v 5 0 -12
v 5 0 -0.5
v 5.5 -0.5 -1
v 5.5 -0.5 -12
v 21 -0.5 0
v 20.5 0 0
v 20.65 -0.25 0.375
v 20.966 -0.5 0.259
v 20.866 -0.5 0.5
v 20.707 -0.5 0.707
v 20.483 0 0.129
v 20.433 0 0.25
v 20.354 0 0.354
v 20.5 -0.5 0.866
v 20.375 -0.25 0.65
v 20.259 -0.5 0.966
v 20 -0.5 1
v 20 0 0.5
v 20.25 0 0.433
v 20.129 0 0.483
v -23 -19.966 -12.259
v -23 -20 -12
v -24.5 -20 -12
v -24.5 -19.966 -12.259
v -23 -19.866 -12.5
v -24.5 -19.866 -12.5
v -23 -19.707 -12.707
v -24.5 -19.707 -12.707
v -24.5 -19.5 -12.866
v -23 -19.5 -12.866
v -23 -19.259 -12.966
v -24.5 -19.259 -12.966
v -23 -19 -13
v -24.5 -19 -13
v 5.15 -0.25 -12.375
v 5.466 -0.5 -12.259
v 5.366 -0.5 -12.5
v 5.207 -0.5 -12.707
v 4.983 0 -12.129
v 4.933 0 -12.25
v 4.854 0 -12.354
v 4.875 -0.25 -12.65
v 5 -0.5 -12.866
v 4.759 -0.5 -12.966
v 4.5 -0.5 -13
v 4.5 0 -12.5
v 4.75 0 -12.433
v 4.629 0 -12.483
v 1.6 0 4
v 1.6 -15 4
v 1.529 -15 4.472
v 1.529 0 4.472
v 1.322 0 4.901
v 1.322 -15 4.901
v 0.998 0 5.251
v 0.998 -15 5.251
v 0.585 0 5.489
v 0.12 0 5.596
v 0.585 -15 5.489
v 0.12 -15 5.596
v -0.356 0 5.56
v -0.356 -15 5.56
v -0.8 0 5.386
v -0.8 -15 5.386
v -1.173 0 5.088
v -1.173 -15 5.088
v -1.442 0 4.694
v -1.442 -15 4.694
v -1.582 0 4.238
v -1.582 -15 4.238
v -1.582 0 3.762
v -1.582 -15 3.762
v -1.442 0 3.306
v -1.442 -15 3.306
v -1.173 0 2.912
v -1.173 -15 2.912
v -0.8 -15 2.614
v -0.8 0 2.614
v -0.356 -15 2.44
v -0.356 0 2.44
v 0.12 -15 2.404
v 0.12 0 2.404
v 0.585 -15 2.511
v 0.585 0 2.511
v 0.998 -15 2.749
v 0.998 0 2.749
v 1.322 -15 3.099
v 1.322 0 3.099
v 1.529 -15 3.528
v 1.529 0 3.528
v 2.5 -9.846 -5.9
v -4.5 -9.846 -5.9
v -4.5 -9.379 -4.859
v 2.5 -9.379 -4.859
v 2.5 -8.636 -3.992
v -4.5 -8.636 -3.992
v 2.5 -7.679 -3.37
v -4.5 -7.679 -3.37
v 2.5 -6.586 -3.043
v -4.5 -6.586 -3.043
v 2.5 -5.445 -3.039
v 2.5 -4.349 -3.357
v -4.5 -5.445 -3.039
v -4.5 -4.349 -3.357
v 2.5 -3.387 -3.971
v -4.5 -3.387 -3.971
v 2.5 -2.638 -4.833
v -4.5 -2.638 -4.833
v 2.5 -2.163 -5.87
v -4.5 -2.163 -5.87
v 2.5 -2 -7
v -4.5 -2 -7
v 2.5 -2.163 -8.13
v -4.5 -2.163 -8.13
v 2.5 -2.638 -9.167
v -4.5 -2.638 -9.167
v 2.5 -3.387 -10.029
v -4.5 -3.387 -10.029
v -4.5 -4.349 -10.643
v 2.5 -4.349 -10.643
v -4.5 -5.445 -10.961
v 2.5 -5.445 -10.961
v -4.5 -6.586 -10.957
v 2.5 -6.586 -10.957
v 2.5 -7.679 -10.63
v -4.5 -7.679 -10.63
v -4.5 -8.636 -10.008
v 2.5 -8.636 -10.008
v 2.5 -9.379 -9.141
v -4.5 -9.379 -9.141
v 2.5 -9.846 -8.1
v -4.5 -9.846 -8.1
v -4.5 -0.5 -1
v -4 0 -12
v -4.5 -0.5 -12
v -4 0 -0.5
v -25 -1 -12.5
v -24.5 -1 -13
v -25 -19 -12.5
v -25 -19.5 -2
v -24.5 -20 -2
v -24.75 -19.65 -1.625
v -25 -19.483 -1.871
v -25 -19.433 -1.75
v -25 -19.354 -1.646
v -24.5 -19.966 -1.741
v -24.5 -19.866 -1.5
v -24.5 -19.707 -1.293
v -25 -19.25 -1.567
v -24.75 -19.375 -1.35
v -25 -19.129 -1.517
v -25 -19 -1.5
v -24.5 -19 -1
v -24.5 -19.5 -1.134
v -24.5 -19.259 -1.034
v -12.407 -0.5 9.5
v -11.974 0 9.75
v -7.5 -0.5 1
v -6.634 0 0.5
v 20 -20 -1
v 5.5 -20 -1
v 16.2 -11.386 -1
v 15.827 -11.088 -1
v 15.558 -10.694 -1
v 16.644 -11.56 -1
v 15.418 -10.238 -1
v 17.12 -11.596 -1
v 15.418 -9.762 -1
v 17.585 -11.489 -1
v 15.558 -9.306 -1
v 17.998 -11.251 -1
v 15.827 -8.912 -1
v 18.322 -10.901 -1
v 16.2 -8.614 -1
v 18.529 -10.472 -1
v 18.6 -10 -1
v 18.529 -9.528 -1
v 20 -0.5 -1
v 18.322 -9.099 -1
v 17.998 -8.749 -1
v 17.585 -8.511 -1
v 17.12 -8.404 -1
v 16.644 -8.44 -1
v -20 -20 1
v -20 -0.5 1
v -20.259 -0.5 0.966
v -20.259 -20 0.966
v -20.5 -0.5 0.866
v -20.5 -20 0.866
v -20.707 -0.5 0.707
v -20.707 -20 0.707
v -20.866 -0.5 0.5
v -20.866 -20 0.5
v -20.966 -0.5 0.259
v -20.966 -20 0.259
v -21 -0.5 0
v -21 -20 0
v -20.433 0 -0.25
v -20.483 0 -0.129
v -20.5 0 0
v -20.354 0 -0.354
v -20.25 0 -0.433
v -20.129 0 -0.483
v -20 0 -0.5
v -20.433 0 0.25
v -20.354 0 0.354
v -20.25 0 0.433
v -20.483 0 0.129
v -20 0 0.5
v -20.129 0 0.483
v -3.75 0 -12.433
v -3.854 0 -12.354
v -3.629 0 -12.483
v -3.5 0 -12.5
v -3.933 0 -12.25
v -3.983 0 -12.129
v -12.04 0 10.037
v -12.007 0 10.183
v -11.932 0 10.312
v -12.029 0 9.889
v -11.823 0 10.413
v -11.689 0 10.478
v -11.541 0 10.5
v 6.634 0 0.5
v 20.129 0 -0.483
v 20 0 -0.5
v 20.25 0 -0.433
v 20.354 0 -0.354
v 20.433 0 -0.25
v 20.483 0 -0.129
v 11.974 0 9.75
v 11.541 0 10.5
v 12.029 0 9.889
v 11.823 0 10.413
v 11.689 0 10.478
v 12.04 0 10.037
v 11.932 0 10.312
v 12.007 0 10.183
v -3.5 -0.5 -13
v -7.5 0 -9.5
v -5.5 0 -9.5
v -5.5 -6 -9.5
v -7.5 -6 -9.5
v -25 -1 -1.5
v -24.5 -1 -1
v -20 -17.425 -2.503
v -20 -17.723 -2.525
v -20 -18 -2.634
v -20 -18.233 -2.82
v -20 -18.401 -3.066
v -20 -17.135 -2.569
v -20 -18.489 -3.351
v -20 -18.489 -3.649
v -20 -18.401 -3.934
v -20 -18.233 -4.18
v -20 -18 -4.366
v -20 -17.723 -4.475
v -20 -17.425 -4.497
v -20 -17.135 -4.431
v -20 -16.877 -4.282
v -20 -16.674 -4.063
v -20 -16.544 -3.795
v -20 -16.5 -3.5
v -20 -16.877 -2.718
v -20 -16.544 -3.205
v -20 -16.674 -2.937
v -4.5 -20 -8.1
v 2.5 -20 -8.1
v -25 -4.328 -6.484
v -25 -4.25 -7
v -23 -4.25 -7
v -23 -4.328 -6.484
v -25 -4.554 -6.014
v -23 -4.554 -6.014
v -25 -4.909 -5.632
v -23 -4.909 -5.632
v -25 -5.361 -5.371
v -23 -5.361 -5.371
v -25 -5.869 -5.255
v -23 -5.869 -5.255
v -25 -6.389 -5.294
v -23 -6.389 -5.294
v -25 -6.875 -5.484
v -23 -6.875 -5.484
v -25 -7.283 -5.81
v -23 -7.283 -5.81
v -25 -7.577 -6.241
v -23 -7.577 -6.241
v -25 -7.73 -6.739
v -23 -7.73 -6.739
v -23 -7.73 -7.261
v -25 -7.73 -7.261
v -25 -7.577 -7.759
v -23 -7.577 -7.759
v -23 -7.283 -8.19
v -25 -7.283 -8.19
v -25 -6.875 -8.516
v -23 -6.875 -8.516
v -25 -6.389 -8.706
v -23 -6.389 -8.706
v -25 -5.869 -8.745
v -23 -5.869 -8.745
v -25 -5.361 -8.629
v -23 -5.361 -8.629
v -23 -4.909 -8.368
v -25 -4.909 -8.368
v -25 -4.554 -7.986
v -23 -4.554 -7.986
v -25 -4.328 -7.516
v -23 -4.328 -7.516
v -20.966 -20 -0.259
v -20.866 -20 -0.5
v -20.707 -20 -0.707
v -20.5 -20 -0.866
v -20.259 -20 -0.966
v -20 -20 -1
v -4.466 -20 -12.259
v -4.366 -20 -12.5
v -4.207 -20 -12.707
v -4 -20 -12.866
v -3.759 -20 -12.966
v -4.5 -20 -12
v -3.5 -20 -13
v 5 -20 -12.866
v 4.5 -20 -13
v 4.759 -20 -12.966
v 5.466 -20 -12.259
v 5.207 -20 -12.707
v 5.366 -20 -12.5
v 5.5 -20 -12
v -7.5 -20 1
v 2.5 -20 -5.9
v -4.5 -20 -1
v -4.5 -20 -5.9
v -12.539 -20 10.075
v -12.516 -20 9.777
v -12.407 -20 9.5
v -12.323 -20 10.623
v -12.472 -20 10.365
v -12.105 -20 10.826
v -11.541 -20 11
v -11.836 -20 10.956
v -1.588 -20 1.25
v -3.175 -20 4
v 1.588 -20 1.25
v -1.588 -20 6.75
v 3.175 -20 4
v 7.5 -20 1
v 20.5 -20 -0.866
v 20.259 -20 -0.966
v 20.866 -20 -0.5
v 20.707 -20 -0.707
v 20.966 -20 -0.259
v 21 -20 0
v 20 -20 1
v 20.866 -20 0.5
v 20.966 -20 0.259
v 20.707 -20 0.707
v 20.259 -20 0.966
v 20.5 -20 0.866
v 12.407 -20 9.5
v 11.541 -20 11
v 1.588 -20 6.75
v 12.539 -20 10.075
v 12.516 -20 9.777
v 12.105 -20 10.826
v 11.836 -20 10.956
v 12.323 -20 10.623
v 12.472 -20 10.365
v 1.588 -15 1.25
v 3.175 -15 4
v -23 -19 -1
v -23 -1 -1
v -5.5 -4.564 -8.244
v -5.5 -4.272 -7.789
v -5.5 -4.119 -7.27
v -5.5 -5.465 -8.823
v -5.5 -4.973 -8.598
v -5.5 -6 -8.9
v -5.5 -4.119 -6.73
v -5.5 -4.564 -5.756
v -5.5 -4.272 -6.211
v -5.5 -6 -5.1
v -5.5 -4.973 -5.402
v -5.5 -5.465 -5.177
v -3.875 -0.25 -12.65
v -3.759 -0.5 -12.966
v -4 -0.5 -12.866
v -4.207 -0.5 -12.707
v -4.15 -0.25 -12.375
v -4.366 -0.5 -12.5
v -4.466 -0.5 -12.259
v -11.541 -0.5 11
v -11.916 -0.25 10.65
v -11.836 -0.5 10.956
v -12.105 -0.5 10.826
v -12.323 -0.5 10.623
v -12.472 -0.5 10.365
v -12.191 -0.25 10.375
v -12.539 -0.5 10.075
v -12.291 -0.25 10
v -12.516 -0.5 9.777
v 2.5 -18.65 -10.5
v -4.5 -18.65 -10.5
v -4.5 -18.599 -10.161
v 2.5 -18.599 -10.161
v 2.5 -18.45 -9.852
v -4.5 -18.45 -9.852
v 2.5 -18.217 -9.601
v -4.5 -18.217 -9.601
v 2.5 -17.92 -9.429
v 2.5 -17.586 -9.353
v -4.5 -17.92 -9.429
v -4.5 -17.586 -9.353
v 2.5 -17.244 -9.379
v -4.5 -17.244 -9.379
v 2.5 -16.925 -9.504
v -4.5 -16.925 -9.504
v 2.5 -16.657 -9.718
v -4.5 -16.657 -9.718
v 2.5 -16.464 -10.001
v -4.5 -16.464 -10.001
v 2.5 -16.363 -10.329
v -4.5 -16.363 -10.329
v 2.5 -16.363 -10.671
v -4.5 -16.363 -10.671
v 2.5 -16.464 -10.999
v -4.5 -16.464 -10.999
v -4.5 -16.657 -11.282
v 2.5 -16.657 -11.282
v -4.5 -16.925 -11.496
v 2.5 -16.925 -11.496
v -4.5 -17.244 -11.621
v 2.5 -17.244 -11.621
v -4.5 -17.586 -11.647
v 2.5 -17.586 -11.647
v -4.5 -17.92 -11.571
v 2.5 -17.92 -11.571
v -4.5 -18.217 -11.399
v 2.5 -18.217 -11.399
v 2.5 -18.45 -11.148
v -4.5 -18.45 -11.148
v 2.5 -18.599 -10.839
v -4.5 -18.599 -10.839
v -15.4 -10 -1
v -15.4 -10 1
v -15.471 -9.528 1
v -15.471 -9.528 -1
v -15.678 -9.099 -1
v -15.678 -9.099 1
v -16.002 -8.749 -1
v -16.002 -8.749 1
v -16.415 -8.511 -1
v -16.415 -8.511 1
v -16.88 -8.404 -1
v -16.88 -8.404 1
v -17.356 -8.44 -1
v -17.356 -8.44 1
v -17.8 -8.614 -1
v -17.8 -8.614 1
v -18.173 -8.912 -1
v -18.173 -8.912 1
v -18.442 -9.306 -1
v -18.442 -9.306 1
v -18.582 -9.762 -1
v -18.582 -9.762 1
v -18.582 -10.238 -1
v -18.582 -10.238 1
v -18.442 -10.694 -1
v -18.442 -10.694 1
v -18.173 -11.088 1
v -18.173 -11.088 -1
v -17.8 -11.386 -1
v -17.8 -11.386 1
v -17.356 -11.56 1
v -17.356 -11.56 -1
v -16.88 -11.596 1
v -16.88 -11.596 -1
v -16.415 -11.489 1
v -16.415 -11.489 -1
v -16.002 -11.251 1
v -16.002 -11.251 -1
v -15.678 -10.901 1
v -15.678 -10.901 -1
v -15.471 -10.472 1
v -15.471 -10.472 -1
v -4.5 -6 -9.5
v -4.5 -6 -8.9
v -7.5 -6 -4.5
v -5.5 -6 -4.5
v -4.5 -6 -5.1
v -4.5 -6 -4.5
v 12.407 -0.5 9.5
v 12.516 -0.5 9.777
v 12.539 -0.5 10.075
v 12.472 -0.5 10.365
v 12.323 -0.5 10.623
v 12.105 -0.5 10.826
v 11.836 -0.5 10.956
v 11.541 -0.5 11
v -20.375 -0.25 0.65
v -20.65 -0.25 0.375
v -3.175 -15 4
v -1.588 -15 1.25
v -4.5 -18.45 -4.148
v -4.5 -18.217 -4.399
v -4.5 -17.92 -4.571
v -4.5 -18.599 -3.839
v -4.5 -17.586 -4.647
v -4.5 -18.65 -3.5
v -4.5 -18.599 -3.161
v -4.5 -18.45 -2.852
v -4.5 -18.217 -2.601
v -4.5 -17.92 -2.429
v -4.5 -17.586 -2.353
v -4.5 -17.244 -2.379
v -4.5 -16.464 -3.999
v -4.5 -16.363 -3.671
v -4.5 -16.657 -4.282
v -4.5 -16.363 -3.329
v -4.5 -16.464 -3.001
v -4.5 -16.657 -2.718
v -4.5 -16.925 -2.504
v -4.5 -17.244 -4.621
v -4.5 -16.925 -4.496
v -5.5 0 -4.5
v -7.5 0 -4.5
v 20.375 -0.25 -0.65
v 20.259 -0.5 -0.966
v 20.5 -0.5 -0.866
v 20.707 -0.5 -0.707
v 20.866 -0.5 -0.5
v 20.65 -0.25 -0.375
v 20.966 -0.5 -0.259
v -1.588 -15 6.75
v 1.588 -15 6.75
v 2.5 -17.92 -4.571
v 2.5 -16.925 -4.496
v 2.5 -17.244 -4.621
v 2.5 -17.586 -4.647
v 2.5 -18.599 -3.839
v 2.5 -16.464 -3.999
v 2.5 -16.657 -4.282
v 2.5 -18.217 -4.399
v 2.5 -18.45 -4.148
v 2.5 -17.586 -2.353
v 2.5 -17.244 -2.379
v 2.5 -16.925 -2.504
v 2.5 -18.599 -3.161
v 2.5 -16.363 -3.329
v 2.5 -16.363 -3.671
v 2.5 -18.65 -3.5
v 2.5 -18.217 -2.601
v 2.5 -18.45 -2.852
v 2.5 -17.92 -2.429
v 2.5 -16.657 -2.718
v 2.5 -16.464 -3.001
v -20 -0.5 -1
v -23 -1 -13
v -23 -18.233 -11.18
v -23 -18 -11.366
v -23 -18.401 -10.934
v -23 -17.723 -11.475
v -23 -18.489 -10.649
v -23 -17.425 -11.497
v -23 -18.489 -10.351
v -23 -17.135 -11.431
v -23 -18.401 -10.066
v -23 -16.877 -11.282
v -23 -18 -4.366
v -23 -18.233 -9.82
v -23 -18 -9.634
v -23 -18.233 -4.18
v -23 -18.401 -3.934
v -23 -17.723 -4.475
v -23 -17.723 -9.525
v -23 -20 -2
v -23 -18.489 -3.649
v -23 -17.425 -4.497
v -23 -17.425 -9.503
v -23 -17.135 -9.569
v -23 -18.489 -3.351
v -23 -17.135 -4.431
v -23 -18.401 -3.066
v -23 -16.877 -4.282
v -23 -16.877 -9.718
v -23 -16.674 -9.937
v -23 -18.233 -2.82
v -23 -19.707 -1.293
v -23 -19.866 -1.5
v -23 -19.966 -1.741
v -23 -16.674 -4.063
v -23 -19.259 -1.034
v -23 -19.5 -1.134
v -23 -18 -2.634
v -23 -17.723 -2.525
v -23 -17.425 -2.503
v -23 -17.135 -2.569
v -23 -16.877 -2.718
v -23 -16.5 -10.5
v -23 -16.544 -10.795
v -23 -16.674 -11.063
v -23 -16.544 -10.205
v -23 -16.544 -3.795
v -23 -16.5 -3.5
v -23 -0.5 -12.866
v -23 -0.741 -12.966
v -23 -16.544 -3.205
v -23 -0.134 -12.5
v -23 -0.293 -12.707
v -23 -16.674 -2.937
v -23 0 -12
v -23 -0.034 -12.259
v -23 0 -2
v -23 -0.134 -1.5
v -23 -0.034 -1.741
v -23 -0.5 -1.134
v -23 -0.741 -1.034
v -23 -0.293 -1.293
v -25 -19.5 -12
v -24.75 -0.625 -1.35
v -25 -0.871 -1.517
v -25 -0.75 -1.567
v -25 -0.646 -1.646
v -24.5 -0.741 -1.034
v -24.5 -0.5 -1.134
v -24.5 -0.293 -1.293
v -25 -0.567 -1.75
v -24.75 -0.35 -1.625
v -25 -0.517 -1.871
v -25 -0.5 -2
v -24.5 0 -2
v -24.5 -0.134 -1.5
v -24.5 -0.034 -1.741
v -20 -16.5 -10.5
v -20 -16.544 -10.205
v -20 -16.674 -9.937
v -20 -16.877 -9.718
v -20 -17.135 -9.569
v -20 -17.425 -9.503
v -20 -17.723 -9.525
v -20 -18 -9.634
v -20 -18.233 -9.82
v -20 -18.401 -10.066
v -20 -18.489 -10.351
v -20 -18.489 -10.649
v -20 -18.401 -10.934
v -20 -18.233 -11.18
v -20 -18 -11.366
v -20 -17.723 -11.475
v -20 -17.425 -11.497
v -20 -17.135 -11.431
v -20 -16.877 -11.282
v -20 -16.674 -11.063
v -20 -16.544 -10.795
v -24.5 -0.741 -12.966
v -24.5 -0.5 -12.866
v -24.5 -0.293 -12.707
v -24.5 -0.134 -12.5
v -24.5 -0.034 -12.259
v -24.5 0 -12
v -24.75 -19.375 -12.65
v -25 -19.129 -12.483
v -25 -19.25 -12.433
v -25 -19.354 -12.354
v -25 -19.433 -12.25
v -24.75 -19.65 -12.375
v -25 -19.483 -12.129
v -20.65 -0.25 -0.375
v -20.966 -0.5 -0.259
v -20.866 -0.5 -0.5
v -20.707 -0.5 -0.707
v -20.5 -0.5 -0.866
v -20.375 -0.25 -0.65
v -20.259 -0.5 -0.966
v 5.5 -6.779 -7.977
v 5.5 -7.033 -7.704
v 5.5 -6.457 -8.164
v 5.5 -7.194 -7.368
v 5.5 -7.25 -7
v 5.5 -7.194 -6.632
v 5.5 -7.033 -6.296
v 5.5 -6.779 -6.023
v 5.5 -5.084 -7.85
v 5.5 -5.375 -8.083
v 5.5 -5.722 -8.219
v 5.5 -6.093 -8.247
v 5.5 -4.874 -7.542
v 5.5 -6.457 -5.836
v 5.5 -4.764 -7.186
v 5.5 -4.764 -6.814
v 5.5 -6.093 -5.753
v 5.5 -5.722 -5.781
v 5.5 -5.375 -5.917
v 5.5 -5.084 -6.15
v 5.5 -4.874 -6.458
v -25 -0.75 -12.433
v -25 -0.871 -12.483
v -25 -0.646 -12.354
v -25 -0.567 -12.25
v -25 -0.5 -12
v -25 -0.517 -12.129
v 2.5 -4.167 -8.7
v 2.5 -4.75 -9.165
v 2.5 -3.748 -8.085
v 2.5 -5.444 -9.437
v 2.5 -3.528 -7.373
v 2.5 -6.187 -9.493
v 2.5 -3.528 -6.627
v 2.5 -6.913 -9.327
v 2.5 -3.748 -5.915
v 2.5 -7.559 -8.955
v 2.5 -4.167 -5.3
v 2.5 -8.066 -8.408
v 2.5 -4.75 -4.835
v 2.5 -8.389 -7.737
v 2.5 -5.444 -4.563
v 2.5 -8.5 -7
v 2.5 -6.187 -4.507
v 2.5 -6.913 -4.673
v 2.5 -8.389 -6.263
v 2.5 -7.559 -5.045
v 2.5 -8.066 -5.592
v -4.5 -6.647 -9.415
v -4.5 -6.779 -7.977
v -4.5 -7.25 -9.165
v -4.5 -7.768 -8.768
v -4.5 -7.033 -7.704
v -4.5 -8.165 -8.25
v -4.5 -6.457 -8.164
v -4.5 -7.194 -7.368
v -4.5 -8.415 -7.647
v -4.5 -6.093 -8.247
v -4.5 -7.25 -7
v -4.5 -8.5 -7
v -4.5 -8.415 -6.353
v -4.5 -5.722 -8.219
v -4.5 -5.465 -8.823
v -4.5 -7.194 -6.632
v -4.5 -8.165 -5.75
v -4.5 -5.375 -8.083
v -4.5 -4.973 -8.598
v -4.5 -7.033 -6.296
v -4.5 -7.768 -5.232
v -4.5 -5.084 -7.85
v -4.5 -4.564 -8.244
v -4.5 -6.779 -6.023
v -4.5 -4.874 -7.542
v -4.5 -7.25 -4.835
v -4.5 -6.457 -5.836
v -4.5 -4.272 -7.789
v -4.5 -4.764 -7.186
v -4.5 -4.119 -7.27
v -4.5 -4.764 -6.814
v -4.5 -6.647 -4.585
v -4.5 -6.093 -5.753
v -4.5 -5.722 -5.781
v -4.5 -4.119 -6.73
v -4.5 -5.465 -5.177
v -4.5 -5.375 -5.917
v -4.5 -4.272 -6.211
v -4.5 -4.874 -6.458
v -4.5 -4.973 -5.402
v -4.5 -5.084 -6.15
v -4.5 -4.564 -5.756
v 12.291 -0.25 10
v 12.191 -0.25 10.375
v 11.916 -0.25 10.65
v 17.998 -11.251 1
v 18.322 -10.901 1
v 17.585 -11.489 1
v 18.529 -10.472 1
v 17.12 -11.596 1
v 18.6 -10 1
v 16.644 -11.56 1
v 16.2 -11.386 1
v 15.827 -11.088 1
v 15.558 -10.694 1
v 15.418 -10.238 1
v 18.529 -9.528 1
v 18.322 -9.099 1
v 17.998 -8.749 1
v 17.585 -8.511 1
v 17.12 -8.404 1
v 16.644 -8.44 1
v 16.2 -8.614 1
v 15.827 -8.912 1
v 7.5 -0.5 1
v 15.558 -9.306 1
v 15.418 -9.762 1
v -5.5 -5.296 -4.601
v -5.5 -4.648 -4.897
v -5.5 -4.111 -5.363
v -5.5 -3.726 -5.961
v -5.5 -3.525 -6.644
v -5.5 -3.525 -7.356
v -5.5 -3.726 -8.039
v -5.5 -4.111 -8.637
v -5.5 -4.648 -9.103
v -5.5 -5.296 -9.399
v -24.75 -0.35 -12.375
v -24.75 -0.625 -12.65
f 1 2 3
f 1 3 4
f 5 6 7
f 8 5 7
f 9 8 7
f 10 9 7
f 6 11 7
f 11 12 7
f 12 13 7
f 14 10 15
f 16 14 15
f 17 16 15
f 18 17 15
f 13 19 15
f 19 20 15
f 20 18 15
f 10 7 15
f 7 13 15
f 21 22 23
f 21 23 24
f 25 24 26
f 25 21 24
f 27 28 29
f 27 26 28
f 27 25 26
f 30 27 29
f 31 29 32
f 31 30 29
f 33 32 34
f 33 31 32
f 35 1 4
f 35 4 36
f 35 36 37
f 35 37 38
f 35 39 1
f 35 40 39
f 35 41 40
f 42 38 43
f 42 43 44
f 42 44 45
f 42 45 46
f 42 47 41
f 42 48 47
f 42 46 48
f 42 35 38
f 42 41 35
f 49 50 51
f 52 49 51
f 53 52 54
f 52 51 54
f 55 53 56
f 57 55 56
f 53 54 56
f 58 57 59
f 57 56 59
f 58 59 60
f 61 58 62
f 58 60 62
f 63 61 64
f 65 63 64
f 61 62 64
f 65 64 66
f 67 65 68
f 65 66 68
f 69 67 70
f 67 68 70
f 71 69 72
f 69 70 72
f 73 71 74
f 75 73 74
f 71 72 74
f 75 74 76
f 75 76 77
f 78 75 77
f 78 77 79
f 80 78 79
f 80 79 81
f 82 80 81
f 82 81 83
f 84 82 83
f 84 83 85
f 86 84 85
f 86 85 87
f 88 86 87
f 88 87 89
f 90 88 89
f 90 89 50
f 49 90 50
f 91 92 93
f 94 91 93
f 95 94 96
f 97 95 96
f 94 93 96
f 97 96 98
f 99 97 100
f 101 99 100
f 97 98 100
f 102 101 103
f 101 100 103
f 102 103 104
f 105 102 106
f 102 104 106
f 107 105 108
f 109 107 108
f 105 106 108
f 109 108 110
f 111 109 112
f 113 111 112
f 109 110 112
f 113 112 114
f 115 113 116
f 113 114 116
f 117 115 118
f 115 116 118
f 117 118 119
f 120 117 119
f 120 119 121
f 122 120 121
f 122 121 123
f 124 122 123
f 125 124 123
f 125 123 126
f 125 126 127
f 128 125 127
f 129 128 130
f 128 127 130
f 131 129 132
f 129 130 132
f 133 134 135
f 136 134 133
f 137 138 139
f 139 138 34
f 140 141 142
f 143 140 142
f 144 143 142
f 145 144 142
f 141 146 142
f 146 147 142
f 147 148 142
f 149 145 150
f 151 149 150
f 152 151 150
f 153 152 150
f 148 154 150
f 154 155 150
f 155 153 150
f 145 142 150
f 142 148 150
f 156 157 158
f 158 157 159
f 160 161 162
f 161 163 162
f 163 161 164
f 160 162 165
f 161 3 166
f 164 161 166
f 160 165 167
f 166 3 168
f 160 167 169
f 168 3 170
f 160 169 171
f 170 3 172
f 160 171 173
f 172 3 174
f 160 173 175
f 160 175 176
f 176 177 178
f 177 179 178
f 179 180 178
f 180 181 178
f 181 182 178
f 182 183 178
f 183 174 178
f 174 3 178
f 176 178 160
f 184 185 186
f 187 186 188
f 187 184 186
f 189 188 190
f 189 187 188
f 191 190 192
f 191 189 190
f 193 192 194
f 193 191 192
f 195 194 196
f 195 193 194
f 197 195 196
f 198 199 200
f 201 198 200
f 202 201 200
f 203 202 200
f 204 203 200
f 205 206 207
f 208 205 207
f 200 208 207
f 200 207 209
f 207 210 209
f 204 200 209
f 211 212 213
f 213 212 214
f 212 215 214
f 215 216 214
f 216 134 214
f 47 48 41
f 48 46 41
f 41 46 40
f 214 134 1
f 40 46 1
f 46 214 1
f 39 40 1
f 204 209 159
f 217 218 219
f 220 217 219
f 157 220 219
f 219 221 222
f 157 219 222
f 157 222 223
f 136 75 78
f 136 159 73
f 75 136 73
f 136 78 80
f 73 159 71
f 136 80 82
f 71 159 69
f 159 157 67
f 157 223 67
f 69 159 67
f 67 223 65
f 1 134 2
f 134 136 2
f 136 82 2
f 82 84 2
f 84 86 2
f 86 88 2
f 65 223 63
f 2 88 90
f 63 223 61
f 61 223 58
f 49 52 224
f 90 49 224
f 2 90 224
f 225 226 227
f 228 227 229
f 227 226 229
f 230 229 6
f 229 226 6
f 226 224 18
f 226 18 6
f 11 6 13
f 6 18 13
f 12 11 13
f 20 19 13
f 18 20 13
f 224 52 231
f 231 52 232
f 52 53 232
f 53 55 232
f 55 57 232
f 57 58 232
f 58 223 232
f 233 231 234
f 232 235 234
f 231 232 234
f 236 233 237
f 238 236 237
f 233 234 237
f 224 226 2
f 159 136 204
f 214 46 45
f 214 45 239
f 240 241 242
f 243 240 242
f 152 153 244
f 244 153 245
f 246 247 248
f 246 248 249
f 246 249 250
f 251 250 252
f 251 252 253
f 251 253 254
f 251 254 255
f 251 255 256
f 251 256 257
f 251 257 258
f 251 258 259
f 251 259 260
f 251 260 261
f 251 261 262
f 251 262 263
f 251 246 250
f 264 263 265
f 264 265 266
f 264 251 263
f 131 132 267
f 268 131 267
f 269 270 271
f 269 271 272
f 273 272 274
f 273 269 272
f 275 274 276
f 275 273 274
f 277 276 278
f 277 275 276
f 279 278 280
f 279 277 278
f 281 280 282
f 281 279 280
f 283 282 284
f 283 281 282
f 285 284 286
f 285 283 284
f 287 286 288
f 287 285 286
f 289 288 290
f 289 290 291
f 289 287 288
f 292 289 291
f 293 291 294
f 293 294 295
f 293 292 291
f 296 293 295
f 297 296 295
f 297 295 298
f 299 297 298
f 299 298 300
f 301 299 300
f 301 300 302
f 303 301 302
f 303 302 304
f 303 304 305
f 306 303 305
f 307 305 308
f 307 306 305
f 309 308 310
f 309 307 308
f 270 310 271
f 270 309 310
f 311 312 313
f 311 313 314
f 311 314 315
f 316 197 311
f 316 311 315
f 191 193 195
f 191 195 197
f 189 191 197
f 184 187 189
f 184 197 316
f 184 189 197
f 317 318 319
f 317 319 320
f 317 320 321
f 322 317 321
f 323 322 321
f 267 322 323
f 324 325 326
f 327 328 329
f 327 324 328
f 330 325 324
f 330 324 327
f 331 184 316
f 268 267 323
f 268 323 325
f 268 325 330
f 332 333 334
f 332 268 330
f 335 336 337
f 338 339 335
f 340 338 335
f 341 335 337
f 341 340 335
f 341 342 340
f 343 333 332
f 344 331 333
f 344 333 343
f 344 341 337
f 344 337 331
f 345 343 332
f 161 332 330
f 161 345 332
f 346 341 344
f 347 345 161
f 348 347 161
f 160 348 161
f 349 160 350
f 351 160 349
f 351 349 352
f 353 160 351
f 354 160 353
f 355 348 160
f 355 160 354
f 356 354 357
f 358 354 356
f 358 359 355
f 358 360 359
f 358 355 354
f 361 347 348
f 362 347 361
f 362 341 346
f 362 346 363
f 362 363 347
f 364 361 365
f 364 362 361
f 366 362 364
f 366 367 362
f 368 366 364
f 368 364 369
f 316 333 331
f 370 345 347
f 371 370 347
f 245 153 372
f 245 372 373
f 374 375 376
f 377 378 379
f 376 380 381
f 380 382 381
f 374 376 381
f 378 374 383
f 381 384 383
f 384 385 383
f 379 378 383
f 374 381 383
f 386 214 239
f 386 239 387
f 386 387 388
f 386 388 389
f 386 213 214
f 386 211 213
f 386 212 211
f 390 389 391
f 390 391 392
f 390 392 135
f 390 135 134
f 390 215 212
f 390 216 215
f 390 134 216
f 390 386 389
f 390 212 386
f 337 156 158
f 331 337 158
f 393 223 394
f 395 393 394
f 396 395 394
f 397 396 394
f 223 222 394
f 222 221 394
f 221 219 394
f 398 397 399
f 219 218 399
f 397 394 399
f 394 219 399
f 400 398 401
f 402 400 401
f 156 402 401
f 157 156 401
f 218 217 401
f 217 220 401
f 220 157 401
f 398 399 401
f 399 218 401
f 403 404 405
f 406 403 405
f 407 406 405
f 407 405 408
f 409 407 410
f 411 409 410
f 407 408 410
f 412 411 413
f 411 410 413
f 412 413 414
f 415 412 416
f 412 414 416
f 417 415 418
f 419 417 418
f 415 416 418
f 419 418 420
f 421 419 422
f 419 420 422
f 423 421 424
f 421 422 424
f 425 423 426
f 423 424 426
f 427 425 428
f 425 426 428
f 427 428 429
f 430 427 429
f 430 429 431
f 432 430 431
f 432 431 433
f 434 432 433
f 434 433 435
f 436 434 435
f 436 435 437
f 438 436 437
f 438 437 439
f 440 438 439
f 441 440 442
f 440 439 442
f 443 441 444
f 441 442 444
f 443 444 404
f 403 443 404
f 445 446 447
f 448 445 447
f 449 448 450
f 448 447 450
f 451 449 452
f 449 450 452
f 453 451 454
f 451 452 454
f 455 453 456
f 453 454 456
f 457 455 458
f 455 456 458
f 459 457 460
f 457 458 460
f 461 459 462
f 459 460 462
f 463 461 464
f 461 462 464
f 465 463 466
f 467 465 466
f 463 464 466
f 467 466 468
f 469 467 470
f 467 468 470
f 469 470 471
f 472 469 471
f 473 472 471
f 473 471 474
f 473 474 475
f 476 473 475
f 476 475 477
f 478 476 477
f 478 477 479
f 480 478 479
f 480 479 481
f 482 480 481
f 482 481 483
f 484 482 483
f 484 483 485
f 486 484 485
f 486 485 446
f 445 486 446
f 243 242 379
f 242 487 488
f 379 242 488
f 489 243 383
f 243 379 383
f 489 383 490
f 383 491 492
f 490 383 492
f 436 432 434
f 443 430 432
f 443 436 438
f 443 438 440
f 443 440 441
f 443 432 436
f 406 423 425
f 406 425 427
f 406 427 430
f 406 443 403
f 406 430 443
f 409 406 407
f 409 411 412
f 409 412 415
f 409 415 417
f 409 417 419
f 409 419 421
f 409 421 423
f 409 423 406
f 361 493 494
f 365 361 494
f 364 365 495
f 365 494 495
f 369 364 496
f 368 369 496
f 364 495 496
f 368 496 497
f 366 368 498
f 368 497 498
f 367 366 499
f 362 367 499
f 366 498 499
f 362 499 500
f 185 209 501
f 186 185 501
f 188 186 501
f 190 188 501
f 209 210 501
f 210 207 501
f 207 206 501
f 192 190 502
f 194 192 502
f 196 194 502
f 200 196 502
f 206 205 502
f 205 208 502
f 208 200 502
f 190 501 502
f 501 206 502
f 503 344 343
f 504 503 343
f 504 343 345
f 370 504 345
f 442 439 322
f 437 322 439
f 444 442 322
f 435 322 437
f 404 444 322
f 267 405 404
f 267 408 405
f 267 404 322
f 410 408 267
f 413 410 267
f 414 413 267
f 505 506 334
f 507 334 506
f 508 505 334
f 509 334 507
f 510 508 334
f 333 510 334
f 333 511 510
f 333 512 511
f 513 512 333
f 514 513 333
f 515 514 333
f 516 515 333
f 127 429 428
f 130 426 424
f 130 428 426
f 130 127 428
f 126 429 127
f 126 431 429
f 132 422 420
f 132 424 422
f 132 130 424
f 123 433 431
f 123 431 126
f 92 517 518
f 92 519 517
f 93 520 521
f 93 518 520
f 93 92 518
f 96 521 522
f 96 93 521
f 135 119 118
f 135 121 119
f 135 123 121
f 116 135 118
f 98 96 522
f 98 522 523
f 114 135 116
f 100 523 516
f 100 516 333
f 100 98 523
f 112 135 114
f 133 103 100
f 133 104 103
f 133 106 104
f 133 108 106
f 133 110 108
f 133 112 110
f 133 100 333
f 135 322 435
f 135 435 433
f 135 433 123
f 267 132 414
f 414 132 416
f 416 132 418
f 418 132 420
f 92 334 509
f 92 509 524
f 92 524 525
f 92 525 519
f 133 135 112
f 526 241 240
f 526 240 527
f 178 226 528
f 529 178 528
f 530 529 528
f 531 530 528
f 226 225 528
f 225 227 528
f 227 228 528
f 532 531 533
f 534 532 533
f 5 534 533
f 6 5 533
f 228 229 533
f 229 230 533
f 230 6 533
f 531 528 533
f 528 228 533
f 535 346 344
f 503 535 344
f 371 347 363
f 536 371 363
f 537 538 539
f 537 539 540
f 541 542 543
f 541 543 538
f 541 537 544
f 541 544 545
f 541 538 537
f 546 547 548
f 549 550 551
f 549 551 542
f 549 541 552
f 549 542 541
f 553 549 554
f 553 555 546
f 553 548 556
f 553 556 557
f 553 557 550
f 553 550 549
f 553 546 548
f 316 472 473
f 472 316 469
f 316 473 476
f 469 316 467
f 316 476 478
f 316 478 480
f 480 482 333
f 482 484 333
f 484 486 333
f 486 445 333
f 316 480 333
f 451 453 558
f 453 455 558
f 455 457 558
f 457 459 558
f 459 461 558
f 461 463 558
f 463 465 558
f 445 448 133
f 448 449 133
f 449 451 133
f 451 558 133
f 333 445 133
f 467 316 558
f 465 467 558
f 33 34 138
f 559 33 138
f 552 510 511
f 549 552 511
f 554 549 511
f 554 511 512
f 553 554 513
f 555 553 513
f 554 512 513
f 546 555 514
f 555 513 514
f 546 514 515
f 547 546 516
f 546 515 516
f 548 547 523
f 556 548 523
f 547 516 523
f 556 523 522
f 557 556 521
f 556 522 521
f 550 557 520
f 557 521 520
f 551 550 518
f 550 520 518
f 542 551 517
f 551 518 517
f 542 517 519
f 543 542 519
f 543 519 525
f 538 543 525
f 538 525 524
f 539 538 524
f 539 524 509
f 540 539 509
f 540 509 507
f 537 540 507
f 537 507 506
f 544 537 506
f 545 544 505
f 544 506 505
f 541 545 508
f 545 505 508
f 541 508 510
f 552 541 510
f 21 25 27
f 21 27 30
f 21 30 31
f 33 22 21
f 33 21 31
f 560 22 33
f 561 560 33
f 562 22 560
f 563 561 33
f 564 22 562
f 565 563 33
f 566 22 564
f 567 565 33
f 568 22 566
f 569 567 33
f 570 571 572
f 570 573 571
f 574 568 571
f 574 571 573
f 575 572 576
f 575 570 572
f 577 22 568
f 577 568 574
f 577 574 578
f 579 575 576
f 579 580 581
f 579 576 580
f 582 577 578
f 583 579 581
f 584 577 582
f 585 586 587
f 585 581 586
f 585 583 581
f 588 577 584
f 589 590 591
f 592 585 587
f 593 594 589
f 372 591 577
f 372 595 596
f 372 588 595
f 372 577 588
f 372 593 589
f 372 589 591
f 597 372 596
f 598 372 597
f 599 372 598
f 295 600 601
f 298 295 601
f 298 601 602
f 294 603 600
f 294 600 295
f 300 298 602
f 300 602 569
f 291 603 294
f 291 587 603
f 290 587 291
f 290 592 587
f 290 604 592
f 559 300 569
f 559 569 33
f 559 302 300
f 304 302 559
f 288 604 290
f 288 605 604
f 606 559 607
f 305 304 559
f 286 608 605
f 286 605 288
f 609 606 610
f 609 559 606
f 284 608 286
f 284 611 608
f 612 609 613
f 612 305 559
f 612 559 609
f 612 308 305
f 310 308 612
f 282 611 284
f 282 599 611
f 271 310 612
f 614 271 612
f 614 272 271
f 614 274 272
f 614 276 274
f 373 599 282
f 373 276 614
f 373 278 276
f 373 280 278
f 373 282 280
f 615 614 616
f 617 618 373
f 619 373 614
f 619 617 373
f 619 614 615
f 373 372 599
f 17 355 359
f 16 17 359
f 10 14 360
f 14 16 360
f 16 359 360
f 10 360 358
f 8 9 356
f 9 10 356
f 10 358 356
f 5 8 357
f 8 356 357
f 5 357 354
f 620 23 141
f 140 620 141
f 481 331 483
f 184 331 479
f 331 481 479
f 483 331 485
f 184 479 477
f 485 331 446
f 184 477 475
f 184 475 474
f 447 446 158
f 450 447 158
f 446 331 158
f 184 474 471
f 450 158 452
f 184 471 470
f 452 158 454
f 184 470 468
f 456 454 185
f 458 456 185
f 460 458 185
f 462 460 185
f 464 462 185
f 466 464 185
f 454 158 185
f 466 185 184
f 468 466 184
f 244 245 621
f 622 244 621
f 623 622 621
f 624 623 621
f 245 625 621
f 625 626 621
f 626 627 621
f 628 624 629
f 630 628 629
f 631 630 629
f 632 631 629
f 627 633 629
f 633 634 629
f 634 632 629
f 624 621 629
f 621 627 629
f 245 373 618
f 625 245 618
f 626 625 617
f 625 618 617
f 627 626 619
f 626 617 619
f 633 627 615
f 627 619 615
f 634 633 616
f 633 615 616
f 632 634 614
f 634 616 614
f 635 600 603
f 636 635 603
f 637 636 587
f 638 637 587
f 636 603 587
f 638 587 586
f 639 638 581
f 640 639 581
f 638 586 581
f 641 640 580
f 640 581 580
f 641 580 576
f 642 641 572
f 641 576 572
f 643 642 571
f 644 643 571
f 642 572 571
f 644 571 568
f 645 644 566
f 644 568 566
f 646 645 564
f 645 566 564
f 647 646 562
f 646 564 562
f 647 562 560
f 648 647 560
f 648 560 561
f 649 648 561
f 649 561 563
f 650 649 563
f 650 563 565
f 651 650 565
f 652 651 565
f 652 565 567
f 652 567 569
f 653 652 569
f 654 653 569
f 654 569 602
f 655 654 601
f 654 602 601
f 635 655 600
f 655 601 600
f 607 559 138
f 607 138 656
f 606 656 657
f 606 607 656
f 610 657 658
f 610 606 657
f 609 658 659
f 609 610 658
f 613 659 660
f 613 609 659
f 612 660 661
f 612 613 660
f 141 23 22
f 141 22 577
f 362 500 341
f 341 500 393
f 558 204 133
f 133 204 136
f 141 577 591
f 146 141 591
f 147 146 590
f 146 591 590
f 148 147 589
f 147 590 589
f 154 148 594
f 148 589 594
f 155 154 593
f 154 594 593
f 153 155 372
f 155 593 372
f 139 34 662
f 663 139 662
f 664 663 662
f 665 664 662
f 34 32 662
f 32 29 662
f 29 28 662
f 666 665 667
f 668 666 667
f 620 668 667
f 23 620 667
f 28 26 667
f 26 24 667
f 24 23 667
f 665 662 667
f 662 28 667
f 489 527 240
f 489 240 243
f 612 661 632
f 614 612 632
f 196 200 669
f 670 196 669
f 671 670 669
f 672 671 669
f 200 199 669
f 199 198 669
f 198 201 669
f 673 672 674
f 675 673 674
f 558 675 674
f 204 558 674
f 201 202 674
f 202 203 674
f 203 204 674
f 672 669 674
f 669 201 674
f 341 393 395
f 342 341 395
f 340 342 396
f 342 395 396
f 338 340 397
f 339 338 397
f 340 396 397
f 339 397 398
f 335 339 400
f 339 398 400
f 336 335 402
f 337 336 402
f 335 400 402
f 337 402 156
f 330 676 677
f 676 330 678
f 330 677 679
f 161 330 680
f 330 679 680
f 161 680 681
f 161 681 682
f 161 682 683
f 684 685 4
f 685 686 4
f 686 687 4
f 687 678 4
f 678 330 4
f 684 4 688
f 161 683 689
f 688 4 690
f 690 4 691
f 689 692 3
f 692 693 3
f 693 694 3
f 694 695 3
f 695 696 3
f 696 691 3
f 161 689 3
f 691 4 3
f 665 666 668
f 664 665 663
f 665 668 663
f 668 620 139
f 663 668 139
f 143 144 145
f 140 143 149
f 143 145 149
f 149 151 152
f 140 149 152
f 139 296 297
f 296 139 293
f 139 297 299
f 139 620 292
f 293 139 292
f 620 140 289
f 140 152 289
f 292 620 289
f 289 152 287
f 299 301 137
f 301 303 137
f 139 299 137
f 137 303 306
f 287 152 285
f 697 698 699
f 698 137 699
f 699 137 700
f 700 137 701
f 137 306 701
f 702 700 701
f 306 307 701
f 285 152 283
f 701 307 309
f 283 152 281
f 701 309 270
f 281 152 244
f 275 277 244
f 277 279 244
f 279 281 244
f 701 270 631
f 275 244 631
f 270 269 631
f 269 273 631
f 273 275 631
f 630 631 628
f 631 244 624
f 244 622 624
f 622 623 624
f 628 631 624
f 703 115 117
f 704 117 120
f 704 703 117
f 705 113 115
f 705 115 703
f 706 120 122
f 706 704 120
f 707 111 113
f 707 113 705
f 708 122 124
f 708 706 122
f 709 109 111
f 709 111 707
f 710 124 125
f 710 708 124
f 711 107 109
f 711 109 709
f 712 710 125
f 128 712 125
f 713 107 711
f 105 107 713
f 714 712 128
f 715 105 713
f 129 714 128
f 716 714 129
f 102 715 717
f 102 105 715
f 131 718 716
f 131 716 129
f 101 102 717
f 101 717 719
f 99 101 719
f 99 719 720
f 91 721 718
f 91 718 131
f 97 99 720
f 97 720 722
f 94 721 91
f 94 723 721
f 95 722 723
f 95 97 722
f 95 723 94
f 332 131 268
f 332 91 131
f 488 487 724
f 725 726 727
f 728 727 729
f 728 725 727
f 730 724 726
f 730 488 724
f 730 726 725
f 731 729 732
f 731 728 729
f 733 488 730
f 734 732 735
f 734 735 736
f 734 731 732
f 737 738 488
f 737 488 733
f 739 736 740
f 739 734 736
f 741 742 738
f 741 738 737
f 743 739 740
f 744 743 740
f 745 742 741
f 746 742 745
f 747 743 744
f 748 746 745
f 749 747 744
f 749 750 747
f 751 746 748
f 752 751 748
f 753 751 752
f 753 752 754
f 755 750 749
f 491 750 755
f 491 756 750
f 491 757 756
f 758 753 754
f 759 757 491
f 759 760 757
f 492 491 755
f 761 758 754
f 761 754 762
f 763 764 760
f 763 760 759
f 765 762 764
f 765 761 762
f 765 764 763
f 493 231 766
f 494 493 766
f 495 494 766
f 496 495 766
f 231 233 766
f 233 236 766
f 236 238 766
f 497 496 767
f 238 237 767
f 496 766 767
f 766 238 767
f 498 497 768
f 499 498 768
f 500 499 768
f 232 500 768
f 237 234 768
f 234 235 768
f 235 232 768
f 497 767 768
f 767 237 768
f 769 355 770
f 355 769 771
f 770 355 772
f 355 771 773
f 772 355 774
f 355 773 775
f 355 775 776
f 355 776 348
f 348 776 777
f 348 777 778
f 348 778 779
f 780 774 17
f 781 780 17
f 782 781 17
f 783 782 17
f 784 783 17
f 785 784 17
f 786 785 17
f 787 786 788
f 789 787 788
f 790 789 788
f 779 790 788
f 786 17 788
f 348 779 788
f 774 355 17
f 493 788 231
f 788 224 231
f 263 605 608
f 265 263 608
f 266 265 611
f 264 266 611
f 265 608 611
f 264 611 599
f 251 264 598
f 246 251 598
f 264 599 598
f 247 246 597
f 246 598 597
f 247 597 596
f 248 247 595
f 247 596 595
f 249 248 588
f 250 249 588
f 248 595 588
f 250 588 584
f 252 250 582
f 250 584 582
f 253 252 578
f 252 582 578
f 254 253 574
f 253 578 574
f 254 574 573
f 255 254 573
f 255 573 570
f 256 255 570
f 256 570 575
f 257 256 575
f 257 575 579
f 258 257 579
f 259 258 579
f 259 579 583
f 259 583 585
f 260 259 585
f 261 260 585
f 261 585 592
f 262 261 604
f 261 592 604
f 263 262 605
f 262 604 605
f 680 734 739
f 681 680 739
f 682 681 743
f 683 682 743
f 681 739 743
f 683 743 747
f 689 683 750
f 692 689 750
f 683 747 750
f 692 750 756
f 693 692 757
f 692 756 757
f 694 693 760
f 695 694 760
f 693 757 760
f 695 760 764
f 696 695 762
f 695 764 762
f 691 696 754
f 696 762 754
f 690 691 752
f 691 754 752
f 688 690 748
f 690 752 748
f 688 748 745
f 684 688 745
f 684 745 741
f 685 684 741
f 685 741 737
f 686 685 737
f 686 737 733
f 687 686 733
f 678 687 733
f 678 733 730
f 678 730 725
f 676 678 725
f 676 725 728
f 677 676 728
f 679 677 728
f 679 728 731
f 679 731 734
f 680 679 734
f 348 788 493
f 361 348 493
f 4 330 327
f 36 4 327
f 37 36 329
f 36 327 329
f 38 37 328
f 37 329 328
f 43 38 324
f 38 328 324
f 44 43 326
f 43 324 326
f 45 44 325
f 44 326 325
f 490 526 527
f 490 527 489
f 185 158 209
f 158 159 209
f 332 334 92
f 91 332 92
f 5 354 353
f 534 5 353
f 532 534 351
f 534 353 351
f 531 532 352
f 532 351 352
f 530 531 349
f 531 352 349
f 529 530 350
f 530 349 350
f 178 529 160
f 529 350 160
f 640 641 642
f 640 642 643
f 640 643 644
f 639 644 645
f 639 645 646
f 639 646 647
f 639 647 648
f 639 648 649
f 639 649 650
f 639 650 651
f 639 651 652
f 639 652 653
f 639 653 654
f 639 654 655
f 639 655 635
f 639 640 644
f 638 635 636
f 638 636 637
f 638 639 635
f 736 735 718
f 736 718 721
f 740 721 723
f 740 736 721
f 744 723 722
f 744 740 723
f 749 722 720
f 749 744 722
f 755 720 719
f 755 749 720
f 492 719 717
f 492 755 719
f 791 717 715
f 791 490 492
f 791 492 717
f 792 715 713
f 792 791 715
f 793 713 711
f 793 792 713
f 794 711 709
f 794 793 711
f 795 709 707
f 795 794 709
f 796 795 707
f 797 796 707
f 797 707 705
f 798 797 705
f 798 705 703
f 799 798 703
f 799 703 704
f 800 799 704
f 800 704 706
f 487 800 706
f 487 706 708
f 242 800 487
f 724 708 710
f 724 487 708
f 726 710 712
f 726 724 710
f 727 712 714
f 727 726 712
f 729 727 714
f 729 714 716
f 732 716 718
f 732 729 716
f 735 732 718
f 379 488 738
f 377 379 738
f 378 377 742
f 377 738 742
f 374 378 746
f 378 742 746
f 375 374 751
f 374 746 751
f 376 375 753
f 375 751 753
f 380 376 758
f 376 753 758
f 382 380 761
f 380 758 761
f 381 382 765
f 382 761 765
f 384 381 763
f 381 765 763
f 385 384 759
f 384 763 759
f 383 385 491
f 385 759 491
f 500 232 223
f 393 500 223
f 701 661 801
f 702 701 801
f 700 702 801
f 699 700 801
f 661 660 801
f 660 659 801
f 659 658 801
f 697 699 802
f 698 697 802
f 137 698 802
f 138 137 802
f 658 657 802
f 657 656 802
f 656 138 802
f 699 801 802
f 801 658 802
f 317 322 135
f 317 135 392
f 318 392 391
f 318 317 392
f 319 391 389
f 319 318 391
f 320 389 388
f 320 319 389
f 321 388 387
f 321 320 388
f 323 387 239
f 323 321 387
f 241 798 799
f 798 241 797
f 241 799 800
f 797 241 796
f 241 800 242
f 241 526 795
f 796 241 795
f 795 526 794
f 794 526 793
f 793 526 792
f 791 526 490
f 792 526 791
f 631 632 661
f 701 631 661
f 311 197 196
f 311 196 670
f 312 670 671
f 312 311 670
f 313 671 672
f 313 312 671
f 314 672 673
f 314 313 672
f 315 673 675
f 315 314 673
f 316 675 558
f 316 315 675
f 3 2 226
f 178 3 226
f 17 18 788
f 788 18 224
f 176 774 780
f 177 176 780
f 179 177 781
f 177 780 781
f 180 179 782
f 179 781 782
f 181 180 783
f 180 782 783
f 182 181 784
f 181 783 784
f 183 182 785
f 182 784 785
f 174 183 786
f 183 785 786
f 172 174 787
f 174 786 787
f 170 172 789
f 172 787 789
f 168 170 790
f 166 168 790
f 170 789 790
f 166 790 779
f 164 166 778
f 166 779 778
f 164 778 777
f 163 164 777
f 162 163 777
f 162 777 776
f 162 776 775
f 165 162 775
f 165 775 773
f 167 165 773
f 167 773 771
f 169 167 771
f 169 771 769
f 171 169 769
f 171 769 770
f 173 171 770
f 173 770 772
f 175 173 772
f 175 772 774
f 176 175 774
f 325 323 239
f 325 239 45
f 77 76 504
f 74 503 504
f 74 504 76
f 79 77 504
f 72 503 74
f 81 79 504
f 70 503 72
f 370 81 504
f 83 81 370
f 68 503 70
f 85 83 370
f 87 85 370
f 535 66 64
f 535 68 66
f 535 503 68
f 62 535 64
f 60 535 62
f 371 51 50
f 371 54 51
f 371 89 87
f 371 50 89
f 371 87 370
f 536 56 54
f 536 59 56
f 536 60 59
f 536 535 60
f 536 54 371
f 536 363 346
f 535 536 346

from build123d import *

# Parameters (mm, degrees)
F0_W       = 10
F0_H       = 12
F1_DEPTH   = 20
F2_R       = 2.5
F2_R_2     = 1.15
F3_DEPTH   = 7
F4_R       = 1.25
F5_DEPTH   = 25.501
F7_DEPTH   = 1
F8_W       = 6
F8_H       = 5
F9_DEPTH   = 2
F11_W      = 20
F11_H      = 12
F11_R      = 1.75
F12_DEPTH  = 2
F13_R      = 1
F14_DEPTH  = 3
F15_R      = 1.6
F16_DEPTH  = 14.001
F18_DEPTH  = 5
F19_R      = 1.6
F20_DEPTH  = 15.001
F21_R      = 0.99999
F21_2_R    = 0.99999
F22_SIZE   = 0.5
F22_2_SIZE = 0.5


# Not quite as in the source:
# - a fillet or chamfer is up to 0.001 mm smaller than in the source, because OpenCascade refuses the exact size


with BuildPart() as f1:
    # F0 (on Front) → F1 (new body)
    with BuildSketch(Plane.XZ):
        with BuildLine():
            Line((-12.4074772881, 9.5), (-7.5, 1))
            Line((-7.5, 1), (7.5, 1))
            Line((7.5, 1), (12.4074772881, 9.5))
            ThreePointArc((12.4074772881, 9.5), (12.4074772881, 10.5), (11.5414518843, 11))
            Line((11.5414518843, 11), (-11.5414518843, 11))
            ThreePointArc((-11.5414518843, 11), (-12.4074772881, 10.5), (-12.4074772881, 9.5))
        make_face()
        Polygon((7.5, 1), (-7.5, 1), (-21, 1), (-21, -1), (-4.5, -1), (5.5, -1), (21, -1), (21, 1), align=None)
        with Locations((0.5, -7)):
            Rectangle(F0_W, F0_H)
    extrude(amount=F1_DEPTH)

    # F2 (on face) → F3 (cut)
    with BuildSketch(Plane(origin=(-4.5, 0, 0), x_dir=(0, -1, 0), z_dir=(-1, 0, 0))):
        with BuildLine():
            ThreePointArc((9.8457769046, -8.1), (9.9612565947, -7.5553793215), (10, -7))
            ThreePointArc((10, -7), (9.9612565947, -6.4446206785), (9.8457769046, -5.9))
            Line((9.8457769046, -5.9), (9.8457769046, -8.1))
        make_face()
        with BuildLine():
            ThreePointArc((9.8457769046, -5.9), (9.9612565947, -6.4446206785), (10, -7))
            ThreePointArc((10, -7), (9.9612565947, -7.5553793215), (9.8457769046, -8.1))
            Line((9.8457769046, -8.1), (20, -8.1))
            Line((20, -8.1), (20, -5.9))
            Line((20, -5.9), (9.8457769046, -5.9))
        make_face()
        with BuildLine():
            Line((9.8457769046, -8.1), (9.8457769046, -5.9))
            ThreePointArc((9.8457769046, -5.9), (2, -7), (9.8457769046, -8.1))
        make_face()
        with Locations((6, -7)):
            Circle(F2_R, mode=Mode.SUBTRACT)
        with Locations((17.5, -10.5)):
            Circle(F2_R_2)
        with Locations((17.5, -3.5)):
            Circle(F2_R_2)
    extrude(amount=-F3_DEPTH, mode=Mode.SUBTRACT)

    # F4 (on face) → F5 (cut, through all)
    with BuildSketch(Plane(origin=(-4.5, 0, 0), x_dir=(0, -1, 0), z_dir=(-1, 0, 0))):
        with Locations((6, -7)):
            Circle(F4_R)
    extrude(amount=-F5_DEPTH, mode=Mode.SUBTRACT)

    # F6 (on face) → F7 (join)
    with BuildSketch(Plane(origin=(-4.5, 0, 0), x_dir=(0, -1, 0), z_dir=(-1, 0, 0))):
        with BuildLine():
            Line((6, -5.1), (6, -4.5))
            ThreePointArc((6, -4.5), (3.5, -7), (6, -9.5))
            Line((6, -9.5), (6, -8.9))
            ThreePointArc((6, -8.9), (4.1, -7), (6, -5.1))
        make_face()
    extrude(amount=F7_DEPTH)

    # F8 (on face) → F9 (join)
    with BuildSketch(Plane(origin=(-5.5, 0, 0), x_dir=(0, -1, 0), z_dir=(-1, 0, 0))):
        with Locations((3, -7)):
            Rectangle(F8_W, F8_H)
    extrude(amount=F9_DEPTH)

    # F15 (on face) → F16 (cut, through all)
    with BuildSketch(Plane.XY.offset(1)):
        with Locations((17, -10)):
            Circle(F15_R)
        with Locations((-17, -10)):
            Circle(F15_R)
    extrude(amount=-F16_DEPTH, mode=Mode.SUBTRACT)

    # F17 (on face) → F18 (cut)
    with BuildSketch(Plane.XZ.offset(20)):
        Polygon((-1.5877132403, 1.25), (1.5877132403, 1.25), (3.1754264805, 4), (1.5877132403, 6.75), (-1.5877132403, 6.75), (-3.1754264805, 4), align=None)
    extrude(amount=-F18_DEPTH, mode=Mode.SUBTRACT)

    # F19 (on face) → F20 (cut, through all)
    with BuildSketch(Plane.XZ.offset(15)):
        with Locations((0, 4)):
            Circle(F19_R)
    extrude(amount=-F20_DEPTH, mode=Mode.SUBTRACT)

    # F21 (radius 1 in the source; OpenCascade refuses exactly that, so slightly less here)
    f21_edges = [f1.edges().sort_by_distance(p)[0] for p in [
        (5.5, -10, -13),
        (21, -10, -1),
        (21, -10, 1),
        (-21, -10, -1),
        (-21, -10, 1),
        (-4.5, -10, -13),
    ]]
    fillet(f21_edges, radius=F21_R)

    # F22
    f22_edges = [f1.edges().sort_by_distance(p)[0] for p in [
        (-4.5, 0, -6.500005),
        (-12.250005, 0, -1),
        (-9.953739, 0, 5.25),
        (12.750005, 0, -1),
    ]]
    chamfer(f22_edges, length=F22_SIZE)


with BuildPart() as f12:
    # F11 (on offset) → F12 (new body)
    with BuildSketch(Plane.YZ.offset(-25)):
        with Locations((-10, -7)):
            Rectangle(F11_W, F11_H)
        with Locations((-6, -7)):
            Circle(F11_R, mode=Mode.SUBTRACT)
    extrude(amount=F12_DEPTH)

    # F13 (on face) → F14 (join)
    with BuildSketch(Plane.YZ.offset(-23)):
        with Locations((-17.5, -10.5)):
            Circle(F13_R)
        with Locations((-17.5, -3.5)):
            Circle(F13_R)
    extrude(amount=F14_DEPTH)

    # F21#2 (radius 1 in the source; OpenCascade refuses exactly that, so slightly less here)
    f21_2_edges = [f12.edges().sort_by_distance(p)[0] for p in [
        (-24, -20, -1),
        (-24, 0, -1),
        (-24, -20, -13),
        (-24, 0, -13),
    ]]
    fillet(f21_2_edges, radius=F21_2_R)

    # F22#2
    f22_2_edges = [f12.edges().sort_by_distance(p)[0] for p in [
        (-25, -10, -1),
    ]]
    chamfer(f22_2_edges, length=F22_2_SIZE)


solid = Compound([f1.part, f12.part])
